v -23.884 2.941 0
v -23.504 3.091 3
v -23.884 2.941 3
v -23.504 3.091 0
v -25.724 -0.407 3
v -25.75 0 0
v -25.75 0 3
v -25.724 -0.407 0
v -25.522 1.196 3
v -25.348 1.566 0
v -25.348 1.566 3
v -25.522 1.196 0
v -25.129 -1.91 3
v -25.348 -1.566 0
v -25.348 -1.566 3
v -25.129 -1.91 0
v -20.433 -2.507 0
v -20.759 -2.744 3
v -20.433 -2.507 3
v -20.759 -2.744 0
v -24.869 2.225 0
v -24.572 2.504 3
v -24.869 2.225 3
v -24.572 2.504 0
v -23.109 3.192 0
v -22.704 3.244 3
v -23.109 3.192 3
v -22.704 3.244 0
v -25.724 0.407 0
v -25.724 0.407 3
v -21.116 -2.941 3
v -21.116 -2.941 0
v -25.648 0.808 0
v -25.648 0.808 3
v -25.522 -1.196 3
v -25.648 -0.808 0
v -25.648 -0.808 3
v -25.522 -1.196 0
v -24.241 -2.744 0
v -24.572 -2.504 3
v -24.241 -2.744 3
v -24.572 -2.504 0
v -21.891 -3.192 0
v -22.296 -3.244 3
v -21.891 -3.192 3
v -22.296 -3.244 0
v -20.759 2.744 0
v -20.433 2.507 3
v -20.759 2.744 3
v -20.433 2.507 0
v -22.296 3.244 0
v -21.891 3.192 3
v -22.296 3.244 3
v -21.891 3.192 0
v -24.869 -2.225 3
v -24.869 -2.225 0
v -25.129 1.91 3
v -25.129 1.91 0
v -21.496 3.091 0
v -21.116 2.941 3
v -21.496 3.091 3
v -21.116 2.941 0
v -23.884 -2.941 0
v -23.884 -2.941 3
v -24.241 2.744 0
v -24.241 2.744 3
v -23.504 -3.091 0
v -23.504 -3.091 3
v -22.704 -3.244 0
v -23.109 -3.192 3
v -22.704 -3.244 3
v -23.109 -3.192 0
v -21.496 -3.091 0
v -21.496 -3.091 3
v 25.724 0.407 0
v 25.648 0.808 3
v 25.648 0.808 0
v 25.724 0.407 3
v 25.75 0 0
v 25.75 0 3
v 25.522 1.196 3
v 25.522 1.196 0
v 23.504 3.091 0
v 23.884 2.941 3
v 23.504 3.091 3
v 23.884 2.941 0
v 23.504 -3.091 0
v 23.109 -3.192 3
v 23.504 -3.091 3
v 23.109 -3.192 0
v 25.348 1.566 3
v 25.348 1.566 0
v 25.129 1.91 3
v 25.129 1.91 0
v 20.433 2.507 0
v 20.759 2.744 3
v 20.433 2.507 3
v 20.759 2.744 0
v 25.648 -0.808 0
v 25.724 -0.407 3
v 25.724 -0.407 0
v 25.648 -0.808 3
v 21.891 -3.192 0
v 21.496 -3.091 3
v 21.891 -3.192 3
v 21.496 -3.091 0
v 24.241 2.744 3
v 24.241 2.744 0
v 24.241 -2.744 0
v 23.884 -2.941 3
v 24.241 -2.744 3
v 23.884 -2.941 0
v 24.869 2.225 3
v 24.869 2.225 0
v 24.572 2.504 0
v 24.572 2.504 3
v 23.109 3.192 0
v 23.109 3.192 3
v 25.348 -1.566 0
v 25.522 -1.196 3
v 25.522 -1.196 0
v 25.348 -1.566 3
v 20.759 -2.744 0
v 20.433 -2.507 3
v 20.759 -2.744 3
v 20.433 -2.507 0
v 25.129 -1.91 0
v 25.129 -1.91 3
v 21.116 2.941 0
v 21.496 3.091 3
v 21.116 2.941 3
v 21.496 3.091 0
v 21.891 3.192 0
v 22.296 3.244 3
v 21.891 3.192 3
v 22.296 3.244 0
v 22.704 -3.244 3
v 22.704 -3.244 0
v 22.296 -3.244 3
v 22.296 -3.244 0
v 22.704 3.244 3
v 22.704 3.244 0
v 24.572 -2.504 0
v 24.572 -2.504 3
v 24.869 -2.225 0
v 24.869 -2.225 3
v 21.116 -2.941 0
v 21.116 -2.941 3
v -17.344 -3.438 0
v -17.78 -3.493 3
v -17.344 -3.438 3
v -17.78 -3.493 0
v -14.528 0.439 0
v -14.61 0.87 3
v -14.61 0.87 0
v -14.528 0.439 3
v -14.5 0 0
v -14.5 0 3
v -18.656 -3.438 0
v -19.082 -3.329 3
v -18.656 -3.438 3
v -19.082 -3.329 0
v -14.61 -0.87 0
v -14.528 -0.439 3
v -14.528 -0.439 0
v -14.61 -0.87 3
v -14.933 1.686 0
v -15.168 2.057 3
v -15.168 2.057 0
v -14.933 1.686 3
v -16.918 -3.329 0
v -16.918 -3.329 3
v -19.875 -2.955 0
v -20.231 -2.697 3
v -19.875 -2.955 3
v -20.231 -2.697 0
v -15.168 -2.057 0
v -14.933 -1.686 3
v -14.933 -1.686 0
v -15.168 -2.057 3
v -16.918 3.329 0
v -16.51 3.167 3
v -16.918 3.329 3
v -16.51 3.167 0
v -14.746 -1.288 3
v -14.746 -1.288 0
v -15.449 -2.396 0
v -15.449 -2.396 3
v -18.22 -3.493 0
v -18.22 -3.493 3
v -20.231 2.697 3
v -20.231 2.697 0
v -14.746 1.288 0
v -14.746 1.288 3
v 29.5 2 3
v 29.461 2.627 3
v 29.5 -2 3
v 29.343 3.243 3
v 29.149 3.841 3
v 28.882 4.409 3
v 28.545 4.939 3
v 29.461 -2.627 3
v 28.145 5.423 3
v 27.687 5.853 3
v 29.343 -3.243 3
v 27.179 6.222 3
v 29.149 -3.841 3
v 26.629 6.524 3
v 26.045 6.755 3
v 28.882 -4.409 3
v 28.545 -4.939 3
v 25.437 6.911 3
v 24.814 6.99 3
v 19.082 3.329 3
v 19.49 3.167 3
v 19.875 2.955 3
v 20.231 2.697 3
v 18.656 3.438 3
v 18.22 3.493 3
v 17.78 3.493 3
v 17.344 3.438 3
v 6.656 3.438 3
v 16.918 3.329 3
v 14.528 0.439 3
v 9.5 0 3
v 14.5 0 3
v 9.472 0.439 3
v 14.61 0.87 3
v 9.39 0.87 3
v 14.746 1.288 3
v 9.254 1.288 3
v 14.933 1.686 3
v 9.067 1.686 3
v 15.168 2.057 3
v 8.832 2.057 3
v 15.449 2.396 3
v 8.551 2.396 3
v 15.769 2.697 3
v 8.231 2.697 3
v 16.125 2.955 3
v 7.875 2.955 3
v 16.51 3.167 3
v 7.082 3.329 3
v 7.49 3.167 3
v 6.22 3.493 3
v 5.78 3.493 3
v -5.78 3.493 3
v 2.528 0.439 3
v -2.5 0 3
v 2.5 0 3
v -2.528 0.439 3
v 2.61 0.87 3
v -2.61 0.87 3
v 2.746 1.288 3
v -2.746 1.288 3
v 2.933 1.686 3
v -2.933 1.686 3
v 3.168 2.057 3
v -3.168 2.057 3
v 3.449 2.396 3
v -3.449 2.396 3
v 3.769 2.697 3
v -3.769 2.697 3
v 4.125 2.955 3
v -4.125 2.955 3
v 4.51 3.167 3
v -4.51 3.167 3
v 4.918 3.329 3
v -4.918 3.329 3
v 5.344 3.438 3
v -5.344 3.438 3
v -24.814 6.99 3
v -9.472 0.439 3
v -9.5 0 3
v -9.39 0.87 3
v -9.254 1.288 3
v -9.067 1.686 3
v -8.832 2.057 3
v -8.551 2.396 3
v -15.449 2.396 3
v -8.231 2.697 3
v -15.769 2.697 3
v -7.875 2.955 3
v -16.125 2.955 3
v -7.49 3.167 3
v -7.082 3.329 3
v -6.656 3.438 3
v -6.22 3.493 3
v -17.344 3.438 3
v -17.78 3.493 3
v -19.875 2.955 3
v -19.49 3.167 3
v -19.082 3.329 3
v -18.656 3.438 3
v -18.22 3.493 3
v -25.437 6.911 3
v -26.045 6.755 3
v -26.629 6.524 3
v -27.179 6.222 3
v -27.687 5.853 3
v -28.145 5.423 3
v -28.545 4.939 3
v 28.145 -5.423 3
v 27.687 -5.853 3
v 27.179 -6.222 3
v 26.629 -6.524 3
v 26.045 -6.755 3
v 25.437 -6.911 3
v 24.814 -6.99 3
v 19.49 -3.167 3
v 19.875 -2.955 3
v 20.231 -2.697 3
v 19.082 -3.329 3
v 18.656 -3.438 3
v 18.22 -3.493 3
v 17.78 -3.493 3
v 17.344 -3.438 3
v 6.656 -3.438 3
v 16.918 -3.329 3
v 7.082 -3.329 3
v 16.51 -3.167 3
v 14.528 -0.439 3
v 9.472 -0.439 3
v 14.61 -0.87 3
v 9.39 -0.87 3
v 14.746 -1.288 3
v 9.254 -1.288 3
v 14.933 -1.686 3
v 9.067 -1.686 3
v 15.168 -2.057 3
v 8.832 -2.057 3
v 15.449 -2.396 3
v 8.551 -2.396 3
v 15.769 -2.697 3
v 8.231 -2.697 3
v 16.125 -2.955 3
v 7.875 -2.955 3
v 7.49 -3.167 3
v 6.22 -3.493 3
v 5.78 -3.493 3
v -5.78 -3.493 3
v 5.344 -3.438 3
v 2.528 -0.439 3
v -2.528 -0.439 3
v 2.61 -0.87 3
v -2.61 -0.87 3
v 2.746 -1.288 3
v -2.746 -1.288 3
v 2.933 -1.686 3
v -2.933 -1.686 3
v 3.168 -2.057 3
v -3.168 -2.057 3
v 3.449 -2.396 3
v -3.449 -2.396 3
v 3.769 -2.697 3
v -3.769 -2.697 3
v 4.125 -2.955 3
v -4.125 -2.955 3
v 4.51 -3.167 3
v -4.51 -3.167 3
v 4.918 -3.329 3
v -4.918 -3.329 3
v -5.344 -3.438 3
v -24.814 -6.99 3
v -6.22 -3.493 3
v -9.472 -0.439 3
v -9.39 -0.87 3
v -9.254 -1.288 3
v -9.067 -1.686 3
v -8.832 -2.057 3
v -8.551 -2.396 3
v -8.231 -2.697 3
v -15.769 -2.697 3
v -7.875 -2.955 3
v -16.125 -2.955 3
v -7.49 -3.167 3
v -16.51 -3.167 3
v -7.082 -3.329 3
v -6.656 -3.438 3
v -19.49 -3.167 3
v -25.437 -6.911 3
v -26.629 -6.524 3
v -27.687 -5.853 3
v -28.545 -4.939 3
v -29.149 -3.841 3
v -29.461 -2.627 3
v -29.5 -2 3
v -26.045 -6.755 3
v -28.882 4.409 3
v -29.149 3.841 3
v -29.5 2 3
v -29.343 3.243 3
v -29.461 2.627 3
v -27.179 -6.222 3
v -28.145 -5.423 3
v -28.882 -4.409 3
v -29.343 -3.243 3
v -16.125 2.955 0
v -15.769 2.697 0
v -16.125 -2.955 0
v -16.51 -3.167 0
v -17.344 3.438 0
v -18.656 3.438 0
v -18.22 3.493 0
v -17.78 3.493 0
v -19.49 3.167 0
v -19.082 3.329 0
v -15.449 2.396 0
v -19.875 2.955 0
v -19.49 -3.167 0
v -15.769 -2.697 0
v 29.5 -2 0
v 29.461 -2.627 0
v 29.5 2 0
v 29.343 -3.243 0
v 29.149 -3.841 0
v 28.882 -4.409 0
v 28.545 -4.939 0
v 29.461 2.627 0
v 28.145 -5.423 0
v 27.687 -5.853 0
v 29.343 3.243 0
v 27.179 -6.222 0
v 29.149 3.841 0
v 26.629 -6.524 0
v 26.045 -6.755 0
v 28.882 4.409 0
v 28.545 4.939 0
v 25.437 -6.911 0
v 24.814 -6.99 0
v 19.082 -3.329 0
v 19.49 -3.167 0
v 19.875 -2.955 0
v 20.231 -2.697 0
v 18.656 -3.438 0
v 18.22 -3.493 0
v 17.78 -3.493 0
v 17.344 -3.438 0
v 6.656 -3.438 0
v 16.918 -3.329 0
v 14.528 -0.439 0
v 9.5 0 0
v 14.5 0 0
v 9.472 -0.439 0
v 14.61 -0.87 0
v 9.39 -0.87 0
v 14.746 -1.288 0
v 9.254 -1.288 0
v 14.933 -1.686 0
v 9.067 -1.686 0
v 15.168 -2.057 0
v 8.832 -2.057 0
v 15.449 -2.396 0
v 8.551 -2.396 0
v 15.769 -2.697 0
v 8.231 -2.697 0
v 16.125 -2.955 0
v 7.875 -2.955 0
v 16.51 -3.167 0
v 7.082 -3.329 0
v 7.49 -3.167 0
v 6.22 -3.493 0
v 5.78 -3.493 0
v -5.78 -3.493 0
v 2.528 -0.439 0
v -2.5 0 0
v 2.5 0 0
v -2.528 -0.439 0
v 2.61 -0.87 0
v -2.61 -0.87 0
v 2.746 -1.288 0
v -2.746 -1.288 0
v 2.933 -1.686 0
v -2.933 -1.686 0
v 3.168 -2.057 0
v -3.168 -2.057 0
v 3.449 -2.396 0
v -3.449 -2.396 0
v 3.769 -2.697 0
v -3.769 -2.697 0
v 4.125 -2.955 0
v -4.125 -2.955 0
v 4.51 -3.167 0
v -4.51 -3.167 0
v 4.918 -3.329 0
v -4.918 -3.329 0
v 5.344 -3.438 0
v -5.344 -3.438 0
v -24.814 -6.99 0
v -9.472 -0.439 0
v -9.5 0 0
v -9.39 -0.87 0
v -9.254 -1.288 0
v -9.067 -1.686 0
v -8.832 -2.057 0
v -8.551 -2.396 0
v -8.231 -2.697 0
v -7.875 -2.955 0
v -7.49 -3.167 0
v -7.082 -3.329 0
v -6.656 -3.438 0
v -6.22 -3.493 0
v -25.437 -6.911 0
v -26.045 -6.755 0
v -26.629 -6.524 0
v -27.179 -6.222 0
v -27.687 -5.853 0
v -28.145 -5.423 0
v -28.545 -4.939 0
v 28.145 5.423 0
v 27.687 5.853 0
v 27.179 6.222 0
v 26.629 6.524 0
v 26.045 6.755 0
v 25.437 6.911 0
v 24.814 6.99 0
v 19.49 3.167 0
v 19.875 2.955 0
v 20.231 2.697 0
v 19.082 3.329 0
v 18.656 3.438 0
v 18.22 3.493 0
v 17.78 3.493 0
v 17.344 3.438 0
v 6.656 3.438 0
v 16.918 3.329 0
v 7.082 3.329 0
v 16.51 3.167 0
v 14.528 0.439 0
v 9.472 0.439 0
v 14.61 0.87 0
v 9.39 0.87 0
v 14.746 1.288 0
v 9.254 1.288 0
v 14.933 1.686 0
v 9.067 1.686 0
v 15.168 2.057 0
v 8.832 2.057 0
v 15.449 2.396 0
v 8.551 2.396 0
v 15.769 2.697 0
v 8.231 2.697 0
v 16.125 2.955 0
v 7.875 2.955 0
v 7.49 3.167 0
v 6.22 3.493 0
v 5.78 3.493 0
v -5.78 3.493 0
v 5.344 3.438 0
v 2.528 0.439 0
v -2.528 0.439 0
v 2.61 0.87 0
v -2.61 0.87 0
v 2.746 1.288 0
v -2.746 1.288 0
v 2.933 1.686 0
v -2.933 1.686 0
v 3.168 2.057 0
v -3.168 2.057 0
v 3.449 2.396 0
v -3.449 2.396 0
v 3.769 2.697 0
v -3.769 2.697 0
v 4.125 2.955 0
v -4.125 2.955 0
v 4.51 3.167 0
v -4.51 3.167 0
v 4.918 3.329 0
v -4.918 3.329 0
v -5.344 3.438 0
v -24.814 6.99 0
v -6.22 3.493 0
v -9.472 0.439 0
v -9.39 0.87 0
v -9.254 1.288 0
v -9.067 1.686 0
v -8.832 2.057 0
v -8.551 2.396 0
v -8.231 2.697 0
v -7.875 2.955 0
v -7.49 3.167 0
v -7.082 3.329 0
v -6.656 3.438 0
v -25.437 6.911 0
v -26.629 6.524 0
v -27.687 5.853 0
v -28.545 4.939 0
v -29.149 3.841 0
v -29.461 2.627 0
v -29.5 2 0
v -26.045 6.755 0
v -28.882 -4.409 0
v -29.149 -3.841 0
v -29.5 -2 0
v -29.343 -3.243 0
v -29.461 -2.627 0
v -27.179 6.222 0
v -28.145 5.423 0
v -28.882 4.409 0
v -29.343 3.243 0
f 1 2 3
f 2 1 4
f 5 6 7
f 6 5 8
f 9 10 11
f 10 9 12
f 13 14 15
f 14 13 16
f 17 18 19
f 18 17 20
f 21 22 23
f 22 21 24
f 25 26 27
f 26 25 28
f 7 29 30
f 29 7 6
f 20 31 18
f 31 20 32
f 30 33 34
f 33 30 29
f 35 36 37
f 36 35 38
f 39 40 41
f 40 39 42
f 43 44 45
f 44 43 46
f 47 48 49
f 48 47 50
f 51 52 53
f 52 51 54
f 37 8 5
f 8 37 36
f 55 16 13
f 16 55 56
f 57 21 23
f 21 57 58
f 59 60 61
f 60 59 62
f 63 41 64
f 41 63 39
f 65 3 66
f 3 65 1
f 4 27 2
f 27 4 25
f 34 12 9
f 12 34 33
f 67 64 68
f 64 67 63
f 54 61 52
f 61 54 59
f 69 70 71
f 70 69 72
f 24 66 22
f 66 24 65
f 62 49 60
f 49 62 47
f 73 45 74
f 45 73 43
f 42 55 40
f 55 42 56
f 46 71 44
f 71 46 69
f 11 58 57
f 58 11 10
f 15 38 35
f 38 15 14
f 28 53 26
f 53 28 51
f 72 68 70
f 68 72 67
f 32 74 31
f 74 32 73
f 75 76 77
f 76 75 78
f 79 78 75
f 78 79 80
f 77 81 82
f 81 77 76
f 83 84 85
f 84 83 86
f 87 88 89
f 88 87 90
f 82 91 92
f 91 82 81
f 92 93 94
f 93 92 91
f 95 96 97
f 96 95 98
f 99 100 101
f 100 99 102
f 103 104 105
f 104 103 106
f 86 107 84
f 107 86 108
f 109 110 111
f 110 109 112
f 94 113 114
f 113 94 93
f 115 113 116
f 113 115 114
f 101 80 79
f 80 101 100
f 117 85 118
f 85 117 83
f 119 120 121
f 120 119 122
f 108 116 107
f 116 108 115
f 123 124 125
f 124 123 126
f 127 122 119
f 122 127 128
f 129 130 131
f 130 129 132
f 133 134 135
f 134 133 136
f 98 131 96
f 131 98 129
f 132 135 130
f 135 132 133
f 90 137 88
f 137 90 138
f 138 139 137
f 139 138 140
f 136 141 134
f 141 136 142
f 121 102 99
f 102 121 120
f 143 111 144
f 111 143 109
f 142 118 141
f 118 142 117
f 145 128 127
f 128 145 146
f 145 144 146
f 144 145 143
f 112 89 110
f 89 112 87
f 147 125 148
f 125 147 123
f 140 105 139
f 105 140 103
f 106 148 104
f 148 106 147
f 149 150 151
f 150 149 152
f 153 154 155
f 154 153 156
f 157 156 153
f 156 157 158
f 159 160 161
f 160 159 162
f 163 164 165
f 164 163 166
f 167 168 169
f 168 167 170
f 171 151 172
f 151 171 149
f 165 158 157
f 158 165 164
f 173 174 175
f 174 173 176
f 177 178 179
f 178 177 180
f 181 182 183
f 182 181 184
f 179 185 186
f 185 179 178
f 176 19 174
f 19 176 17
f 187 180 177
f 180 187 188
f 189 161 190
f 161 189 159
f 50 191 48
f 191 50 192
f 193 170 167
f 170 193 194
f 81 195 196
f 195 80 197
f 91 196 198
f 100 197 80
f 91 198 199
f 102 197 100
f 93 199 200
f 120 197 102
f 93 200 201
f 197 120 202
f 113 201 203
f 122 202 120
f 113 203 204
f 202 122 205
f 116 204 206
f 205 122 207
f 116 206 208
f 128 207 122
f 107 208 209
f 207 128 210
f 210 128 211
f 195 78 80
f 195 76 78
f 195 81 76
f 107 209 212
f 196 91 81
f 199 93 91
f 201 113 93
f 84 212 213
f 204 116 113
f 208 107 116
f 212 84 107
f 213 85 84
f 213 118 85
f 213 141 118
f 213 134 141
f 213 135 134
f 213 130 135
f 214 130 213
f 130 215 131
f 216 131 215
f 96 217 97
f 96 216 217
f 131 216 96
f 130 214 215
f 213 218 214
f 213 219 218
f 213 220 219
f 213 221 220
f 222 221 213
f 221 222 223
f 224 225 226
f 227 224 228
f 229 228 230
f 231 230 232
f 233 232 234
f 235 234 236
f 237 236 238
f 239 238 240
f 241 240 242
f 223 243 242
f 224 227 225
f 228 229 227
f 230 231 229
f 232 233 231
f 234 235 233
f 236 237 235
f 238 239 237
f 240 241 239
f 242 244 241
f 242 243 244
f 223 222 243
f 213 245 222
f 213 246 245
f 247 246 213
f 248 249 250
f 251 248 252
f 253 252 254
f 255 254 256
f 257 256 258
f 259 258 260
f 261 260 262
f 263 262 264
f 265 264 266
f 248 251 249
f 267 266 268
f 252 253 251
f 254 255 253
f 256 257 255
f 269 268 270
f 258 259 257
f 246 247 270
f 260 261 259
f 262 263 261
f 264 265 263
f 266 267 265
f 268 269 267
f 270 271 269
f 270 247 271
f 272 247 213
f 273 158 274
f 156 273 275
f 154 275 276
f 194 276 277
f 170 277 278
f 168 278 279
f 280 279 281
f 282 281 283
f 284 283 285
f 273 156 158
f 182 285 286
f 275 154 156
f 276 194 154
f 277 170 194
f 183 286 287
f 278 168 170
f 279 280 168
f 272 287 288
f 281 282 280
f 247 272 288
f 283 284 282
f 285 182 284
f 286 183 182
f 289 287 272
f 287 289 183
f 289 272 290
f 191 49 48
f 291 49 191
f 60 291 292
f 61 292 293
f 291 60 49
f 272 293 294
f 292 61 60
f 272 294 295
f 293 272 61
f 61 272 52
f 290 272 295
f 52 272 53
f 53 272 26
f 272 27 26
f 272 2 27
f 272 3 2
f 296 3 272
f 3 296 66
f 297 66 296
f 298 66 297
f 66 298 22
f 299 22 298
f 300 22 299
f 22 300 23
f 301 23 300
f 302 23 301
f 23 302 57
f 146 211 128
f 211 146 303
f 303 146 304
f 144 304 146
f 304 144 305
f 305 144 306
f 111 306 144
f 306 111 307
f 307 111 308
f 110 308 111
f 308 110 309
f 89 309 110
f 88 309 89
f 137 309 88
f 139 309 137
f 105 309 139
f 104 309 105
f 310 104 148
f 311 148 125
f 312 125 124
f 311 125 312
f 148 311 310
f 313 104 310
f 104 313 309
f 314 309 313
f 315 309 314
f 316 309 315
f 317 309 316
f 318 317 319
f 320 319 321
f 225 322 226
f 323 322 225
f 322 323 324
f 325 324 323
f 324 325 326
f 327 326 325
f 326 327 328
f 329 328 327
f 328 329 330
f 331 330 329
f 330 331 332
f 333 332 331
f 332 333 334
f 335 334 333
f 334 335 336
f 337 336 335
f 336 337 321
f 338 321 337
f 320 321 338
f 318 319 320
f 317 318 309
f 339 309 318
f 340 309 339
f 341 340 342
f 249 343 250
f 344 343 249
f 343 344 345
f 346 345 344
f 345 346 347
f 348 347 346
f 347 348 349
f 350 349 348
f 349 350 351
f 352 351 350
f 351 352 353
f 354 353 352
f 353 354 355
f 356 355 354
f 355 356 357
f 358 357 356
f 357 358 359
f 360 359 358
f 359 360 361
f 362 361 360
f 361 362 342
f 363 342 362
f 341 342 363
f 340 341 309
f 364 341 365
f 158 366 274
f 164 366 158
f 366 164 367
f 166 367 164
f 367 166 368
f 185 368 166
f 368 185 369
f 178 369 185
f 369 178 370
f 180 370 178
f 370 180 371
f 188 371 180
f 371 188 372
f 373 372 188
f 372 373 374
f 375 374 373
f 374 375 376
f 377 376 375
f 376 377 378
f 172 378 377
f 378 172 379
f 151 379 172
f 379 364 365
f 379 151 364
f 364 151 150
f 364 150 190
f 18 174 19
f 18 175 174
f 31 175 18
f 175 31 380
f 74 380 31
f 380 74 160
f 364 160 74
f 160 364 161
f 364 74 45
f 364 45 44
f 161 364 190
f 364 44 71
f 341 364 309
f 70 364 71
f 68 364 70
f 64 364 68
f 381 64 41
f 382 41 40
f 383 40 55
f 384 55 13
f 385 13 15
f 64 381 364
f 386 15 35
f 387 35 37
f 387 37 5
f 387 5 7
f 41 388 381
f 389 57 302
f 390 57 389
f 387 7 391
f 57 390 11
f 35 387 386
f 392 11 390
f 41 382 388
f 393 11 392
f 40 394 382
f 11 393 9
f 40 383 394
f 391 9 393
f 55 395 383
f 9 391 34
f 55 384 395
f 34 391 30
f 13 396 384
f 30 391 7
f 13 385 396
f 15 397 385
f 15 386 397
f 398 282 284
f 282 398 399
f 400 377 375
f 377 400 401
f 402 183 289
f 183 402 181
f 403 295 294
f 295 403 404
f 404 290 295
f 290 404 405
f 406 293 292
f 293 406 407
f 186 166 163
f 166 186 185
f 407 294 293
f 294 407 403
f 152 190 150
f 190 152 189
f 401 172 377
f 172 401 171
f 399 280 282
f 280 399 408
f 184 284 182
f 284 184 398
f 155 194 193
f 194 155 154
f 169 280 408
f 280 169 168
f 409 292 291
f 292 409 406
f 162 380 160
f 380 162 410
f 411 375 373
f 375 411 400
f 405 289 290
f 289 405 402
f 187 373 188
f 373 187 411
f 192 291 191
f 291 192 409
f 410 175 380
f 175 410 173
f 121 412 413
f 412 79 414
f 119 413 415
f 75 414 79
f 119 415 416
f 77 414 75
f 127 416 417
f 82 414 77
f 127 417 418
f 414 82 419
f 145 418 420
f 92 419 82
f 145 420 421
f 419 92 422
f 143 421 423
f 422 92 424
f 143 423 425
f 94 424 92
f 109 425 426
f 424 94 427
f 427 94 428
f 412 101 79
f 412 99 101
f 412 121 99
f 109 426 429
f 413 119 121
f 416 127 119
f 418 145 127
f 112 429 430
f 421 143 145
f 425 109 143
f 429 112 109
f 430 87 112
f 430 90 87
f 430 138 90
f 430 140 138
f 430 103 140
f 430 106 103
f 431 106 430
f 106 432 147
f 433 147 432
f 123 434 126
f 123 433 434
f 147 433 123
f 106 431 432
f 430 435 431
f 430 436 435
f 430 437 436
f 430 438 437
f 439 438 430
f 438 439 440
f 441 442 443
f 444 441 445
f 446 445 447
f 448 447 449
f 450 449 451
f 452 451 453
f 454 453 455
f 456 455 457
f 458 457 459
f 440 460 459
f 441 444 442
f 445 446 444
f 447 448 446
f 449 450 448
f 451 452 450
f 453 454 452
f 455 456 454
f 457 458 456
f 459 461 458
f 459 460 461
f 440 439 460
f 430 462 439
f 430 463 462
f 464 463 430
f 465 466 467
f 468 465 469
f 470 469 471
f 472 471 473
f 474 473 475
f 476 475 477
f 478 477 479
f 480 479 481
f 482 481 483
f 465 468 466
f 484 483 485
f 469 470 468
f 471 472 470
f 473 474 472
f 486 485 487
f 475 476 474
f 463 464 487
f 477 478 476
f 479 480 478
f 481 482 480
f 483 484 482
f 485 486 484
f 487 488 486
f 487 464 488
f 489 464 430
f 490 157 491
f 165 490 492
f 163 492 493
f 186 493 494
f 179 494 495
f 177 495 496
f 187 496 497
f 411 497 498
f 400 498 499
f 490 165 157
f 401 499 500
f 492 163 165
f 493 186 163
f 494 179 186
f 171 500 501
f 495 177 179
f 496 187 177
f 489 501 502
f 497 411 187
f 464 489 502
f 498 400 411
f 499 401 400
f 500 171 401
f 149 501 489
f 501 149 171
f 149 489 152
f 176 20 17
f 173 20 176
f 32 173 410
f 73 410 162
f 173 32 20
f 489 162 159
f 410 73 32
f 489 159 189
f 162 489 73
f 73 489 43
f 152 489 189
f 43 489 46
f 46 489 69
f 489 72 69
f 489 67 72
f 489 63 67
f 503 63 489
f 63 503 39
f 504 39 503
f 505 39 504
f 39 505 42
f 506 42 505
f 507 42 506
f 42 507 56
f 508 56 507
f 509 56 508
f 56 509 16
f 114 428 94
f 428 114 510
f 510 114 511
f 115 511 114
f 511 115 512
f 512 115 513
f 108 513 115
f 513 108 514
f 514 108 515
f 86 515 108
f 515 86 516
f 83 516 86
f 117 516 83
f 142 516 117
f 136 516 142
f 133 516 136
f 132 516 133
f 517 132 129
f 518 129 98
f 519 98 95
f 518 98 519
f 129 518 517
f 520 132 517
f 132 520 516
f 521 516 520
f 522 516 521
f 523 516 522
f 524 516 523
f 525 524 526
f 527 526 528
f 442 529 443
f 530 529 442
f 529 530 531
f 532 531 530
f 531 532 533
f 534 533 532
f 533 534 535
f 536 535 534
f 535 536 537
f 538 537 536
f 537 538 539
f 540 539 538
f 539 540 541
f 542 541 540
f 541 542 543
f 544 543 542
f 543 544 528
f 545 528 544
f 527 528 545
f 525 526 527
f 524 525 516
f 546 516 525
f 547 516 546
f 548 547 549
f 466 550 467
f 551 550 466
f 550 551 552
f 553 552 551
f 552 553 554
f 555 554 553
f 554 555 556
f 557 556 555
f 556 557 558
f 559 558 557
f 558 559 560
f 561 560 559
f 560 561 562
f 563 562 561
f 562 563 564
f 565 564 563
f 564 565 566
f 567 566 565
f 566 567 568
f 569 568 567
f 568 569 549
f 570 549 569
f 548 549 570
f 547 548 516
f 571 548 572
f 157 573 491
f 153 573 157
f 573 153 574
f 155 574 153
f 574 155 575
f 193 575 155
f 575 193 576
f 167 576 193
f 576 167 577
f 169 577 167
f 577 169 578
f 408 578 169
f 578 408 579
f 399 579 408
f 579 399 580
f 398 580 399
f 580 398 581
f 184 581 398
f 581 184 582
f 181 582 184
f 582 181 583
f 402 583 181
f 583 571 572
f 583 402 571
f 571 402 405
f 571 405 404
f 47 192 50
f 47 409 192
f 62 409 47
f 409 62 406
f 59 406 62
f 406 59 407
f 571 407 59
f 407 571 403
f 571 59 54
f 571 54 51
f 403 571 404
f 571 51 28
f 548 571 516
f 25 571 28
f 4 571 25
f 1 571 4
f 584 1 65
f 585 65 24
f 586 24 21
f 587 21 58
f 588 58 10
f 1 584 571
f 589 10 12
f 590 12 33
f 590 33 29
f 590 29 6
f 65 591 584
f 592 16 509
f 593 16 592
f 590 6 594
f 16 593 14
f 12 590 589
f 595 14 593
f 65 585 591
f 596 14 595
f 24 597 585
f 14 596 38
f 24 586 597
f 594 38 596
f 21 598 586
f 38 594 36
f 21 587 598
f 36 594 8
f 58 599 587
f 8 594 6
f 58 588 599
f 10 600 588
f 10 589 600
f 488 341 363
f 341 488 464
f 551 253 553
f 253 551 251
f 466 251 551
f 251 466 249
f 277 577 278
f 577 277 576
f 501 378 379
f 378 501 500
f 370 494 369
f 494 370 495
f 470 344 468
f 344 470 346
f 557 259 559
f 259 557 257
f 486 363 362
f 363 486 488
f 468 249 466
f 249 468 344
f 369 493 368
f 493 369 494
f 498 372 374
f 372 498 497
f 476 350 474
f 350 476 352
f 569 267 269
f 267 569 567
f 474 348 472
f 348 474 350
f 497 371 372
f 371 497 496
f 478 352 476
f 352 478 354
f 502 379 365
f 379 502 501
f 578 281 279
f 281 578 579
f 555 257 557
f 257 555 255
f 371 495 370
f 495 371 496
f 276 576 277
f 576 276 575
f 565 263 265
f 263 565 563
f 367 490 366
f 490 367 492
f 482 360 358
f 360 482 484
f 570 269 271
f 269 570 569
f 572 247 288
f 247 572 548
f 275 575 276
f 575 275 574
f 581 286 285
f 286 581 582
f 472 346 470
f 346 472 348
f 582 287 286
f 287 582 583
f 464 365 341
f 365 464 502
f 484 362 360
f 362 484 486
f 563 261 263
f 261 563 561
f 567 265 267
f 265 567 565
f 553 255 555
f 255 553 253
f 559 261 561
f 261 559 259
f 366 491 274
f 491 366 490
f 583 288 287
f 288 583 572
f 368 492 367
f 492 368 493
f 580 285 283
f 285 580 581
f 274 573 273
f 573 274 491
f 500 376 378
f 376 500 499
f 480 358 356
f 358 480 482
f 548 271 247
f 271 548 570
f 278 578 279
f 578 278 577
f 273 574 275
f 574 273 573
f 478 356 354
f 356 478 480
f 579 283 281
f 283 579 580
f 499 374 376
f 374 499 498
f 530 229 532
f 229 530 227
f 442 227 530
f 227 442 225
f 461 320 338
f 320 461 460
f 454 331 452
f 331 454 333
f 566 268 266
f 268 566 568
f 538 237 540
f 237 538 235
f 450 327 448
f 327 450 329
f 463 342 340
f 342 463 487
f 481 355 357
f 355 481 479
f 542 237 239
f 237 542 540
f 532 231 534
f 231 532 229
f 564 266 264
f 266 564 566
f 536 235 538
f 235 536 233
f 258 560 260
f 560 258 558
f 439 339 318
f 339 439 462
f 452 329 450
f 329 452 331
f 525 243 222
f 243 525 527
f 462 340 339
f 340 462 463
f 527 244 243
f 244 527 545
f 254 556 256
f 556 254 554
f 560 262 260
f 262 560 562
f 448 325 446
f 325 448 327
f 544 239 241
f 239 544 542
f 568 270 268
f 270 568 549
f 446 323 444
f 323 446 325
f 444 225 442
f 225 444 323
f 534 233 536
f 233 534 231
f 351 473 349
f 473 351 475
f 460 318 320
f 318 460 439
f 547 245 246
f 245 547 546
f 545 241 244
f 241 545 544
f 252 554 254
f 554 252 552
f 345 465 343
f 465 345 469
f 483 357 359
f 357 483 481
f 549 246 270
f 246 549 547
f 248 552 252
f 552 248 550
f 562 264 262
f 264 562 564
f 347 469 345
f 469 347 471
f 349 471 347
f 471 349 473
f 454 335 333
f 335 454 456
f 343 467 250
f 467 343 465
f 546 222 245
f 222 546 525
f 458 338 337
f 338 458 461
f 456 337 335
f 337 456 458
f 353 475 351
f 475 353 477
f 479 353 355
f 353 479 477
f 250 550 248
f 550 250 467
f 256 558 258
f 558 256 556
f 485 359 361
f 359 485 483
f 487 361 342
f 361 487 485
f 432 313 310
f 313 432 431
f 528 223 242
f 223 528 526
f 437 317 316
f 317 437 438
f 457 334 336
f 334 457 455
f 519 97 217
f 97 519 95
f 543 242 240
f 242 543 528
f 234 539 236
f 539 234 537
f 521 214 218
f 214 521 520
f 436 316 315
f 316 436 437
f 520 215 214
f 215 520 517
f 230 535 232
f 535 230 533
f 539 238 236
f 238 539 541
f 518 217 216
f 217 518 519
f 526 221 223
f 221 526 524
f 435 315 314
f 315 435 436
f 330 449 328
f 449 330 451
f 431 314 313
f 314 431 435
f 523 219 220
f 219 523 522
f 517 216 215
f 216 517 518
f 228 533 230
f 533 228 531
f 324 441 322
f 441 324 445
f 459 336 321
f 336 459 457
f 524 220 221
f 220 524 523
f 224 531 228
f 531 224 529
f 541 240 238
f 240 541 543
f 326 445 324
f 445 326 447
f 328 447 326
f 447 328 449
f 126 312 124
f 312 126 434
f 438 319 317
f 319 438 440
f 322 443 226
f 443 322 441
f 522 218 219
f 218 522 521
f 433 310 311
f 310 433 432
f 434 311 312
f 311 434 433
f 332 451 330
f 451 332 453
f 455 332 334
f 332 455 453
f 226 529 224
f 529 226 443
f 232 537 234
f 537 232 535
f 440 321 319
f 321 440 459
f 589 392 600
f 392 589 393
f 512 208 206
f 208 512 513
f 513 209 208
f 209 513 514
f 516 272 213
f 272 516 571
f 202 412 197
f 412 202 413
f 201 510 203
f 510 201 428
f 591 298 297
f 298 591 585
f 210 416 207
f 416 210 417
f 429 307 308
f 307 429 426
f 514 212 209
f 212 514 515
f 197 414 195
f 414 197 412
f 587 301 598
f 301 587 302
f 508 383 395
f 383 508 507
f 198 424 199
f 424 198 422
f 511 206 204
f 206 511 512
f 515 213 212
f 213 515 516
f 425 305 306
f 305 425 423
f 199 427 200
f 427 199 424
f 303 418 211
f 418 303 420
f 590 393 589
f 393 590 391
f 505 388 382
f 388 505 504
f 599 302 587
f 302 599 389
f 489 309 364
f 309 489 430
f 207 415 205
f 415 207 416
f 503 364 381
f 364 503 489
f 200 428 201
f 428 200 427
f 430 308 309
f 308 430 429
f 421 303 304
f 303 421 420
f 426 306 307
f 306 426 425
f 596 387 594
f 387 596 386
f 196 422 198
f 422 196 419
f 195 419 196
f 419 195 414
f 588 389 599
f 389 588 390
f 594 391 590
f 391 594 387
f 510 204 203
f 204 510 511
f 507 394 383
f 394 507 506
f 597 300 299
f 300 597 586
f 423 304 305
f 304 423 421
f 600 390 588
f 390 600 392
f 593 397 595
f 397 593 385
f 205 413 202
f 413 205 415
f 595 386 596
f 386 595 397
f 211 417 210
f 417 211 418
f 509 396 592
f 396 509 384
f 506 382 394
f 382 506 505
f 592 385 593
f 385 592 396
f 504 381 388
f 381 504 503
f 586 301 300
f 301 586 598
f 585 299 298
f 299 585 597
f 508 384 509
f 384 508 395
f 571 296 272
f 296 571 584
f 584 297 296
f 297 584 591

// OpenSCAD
$fn = 50;


difference() {
	union() {
		hull() {
			translate(v = [-24.5000000000, 2.0000000000, 0]) {
				cylinder(h = 3, r = 5);
			}
			translate(v = [24.5000000000, 2.0000000000, 0]) {
				cylinder(h = 3, r = 5);
			}
			translate(v = [-24.5000000000, -2.0000000000, 0]) {
				cylinder(h = 3, r = 5);
			}
			translate(v = [24.5000000000, -2.0000000000, 0]) {
				cylinder(h = 3, r = 5);
			}
		}
	}
	union() {
		#translate(v = [-22.5000000000, 0.0000000000, -100.0000000000]) {
			cylinder(h = 200, r = 3.2500000000);
		}
		#translate(v = [-22.5000000000, 0.0000000000, -100.0000000000]) {
			cylinder(h = 200, r = 3.2500000000);
		}
		#translate(v = [22.5000000000, 0.0000000000, -100.0000000000]) {
			cylinder(h = 200, r = 3.2500000000);
		}
		#translate(v = [22.5000000000, 0.0000000000, -100.0000000000]) {
			cylinder(h = 200, r = 3.2500000000);
		}
		#translate(v = [-18.0000000000, 0, 0]) {
			cylinder(h = 3, r = 3.5000000000);
		}
		#translate(v = [-6.0000000000, 0, 0]) {
			cylinder(h = 3, r = 3.5000000000);
		}
		#translate(v = [6.0000000000, 0, 0]) {
			cylinder(h = 3, r = 3.5000000000);
		}
		#translate(v = [18.0000000000, 0, 0]) {
			cylinder(h = 3, r = 3.5000000000);
		}
	}
}
